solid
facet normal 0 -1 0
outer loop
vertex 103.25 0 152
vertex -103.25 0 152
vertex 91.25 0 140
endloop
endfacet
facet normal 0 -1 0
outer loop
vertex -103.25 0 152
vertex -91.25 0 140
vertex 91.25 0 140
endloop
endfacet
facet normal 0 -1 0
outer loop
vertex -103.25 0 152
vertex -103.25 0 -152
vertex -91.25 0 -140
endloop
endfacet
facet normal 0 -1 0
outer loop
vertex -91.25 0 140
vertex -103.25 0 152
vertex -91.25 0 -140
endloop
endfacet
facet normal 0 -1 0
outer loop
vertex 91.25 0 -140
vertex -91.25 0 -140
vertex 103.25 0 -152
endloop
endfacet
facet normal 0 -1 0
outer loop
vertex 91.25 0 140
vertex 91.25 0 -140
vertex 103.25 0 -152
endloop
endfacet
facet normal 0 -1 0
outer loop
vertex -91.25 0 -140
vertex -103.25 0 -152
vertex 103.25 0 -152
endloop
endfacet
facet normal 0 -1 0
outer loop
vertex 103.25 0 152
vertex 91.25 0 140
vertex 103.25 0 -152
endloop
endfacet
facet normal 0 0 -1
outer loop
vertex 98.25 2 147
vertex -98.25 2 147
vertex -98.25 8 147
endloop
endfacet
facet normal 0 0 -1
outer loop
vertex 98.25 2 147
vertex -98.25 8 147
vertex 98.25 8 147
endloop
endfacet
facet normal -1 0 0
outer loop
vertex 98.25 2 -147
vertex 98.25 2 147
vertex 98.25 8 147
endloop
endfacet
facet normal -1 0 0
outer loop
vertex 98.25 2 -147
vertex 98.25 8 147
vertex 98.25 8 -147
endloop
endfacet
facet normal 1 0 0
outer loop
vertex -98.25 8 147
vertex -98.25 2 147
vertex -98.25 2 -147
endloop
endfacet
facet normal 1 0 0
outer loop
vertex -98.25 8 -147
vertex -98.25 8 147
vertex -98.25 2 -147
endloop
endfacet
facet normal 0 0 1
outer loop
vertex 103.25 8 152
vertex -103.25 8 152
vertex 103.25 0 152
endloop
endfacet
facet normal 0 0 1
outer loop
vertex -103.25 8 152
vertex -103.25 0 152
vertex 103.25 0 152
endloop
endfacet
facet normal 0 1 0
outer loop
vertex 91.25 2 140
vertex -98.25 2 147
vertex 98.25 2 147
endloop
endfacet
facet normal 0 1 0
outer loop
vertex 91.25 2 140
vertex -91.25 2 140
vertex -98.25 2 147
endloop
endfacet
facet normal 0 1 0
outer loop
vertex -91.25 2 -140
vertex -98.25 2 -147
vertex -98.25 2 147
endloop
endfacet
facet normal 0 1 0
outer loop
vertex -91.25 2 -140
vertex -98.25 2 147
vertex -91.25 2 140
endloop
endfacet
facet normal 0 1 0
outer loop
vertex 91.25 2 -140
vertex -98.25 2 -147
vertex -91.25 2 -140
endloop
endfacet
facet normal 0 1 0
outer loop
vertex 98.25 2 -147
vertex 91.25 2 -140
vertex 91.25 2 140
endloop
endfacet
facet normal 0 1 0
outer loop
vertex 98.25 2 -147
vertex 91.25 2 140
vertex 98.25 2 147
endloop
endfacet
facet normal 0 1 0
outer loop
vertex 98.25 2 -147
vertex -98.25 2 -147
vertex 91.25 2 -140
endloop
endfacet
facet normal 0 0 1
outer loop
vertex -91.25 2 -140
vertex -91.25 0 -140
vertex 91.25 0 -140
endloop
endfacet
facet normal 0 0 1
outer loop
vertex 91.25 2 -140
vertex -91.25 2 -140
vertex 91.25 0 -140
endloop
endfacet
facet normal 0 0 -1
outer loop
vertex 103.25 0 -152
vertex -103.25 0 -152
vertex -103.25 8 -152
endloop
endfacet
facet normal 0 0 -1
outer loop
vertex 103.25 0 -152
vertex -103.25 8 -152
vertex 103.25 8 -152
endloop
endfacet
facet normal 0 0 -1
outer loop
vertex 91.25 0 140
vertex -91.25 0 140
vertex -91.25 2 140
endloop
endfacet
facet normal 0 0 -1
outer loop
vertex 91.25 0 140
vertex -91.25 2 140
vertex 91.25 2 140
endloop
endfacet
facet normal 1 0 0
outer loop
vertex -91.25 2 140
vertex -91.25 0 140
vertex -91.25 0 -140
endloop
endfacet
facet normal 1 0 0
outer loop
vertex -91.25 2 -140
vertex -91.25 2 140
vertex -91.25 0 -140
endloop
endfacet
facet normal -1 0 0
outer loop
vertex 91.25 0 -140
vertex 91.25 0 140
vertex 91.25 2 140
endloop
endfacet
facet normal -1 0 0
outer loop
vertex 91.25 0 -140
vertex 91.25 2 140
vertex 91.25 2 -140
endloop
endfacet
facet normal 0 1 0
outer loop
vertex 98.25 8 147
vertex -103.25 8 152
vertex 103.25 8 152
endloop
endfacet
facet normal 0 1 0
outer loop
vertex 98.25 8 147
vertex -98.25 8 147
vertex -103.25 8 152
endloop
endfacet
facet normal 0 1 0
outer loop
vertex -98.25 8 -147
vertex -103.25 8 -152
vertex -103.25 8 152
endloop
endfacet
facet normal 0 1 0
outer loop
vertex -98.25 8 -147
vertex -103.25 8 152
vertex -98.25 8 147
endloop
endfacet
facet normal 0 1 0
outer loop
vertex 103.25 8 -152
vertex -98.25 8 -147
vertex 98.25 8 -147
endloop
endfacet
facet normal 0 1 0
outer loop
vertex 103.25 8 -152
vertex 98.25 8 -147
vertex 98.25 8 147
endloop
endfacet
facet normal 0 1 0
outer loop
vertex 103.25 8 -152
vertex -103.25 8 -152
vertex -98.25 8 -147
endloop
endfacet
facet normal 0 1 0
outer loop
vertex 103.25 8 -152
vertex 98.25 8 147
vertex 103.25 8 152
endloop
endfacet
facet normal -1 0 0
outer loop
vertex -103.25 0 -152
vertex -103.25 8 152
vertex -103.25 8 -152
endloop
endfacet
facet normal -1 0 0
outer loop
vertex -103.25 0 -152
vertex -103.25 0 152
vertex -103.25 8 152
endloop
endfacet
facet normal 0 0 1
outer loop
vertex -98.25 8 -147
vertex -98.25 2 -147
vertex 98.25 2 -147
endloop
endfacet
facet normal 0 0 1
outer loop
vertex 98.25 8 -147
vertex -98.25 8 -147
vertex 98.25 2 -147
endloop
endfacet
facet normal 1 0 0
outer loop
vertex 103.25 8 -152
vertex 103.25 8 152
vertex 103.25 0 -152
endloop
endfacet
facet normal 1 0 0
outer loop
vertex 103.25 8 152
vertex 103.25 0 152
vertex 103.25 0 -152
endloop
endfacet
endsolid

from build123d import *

# Parameters (mm, degrees)
SKETCH1_W           = 206.5
SKETCH1_H           = 304
SKETCH1_W_2         = 182.5
SKETCH1_H_2         = 280
BOSS_EXTRUDE1_DEPTH = 2
SKETCH2_W           = 206.5
SKETCH2_H           = 304
SKETCH2_W_2         = 196.5
SKETCH2_H_2         = 294
BOSS_EXTRUDE2_DEPTH = 6


with BuildPart() as part:
    # Sketch1 → Boss-Extrude1 (new body)
    with BuildSketch(Plane(origin=(0, 0, 0), x_dir=(1, 0, 0), z_dir=(0, 1, 0))):
        Rectangle(SKETCH1_W, SKETCH1_H)
        Rectangle(SKETCH1_W_2, SKETCH1_H_2, mode=Mode.SUBTRACT)
    extrude(amount=BOSS_EXTRUDE1_DEPTH)

    # Sketch2 → Boss-Extrude2 (add)
    with BuildSketch(Plane(origin=(0, 2, 0), x_dir=(1, 0, 0), z_dir=(0, 1, 0))):
        Rectangle(SKETCH2_W, SKETCH2_H)
        Rectangle(SKETCH2_W_2, SKETCH2_H_2, mode=Mode.SUBTRACT)
    extrude(amount=BOSS_EXTRUDE2_DEPTH)


solid = part.part
